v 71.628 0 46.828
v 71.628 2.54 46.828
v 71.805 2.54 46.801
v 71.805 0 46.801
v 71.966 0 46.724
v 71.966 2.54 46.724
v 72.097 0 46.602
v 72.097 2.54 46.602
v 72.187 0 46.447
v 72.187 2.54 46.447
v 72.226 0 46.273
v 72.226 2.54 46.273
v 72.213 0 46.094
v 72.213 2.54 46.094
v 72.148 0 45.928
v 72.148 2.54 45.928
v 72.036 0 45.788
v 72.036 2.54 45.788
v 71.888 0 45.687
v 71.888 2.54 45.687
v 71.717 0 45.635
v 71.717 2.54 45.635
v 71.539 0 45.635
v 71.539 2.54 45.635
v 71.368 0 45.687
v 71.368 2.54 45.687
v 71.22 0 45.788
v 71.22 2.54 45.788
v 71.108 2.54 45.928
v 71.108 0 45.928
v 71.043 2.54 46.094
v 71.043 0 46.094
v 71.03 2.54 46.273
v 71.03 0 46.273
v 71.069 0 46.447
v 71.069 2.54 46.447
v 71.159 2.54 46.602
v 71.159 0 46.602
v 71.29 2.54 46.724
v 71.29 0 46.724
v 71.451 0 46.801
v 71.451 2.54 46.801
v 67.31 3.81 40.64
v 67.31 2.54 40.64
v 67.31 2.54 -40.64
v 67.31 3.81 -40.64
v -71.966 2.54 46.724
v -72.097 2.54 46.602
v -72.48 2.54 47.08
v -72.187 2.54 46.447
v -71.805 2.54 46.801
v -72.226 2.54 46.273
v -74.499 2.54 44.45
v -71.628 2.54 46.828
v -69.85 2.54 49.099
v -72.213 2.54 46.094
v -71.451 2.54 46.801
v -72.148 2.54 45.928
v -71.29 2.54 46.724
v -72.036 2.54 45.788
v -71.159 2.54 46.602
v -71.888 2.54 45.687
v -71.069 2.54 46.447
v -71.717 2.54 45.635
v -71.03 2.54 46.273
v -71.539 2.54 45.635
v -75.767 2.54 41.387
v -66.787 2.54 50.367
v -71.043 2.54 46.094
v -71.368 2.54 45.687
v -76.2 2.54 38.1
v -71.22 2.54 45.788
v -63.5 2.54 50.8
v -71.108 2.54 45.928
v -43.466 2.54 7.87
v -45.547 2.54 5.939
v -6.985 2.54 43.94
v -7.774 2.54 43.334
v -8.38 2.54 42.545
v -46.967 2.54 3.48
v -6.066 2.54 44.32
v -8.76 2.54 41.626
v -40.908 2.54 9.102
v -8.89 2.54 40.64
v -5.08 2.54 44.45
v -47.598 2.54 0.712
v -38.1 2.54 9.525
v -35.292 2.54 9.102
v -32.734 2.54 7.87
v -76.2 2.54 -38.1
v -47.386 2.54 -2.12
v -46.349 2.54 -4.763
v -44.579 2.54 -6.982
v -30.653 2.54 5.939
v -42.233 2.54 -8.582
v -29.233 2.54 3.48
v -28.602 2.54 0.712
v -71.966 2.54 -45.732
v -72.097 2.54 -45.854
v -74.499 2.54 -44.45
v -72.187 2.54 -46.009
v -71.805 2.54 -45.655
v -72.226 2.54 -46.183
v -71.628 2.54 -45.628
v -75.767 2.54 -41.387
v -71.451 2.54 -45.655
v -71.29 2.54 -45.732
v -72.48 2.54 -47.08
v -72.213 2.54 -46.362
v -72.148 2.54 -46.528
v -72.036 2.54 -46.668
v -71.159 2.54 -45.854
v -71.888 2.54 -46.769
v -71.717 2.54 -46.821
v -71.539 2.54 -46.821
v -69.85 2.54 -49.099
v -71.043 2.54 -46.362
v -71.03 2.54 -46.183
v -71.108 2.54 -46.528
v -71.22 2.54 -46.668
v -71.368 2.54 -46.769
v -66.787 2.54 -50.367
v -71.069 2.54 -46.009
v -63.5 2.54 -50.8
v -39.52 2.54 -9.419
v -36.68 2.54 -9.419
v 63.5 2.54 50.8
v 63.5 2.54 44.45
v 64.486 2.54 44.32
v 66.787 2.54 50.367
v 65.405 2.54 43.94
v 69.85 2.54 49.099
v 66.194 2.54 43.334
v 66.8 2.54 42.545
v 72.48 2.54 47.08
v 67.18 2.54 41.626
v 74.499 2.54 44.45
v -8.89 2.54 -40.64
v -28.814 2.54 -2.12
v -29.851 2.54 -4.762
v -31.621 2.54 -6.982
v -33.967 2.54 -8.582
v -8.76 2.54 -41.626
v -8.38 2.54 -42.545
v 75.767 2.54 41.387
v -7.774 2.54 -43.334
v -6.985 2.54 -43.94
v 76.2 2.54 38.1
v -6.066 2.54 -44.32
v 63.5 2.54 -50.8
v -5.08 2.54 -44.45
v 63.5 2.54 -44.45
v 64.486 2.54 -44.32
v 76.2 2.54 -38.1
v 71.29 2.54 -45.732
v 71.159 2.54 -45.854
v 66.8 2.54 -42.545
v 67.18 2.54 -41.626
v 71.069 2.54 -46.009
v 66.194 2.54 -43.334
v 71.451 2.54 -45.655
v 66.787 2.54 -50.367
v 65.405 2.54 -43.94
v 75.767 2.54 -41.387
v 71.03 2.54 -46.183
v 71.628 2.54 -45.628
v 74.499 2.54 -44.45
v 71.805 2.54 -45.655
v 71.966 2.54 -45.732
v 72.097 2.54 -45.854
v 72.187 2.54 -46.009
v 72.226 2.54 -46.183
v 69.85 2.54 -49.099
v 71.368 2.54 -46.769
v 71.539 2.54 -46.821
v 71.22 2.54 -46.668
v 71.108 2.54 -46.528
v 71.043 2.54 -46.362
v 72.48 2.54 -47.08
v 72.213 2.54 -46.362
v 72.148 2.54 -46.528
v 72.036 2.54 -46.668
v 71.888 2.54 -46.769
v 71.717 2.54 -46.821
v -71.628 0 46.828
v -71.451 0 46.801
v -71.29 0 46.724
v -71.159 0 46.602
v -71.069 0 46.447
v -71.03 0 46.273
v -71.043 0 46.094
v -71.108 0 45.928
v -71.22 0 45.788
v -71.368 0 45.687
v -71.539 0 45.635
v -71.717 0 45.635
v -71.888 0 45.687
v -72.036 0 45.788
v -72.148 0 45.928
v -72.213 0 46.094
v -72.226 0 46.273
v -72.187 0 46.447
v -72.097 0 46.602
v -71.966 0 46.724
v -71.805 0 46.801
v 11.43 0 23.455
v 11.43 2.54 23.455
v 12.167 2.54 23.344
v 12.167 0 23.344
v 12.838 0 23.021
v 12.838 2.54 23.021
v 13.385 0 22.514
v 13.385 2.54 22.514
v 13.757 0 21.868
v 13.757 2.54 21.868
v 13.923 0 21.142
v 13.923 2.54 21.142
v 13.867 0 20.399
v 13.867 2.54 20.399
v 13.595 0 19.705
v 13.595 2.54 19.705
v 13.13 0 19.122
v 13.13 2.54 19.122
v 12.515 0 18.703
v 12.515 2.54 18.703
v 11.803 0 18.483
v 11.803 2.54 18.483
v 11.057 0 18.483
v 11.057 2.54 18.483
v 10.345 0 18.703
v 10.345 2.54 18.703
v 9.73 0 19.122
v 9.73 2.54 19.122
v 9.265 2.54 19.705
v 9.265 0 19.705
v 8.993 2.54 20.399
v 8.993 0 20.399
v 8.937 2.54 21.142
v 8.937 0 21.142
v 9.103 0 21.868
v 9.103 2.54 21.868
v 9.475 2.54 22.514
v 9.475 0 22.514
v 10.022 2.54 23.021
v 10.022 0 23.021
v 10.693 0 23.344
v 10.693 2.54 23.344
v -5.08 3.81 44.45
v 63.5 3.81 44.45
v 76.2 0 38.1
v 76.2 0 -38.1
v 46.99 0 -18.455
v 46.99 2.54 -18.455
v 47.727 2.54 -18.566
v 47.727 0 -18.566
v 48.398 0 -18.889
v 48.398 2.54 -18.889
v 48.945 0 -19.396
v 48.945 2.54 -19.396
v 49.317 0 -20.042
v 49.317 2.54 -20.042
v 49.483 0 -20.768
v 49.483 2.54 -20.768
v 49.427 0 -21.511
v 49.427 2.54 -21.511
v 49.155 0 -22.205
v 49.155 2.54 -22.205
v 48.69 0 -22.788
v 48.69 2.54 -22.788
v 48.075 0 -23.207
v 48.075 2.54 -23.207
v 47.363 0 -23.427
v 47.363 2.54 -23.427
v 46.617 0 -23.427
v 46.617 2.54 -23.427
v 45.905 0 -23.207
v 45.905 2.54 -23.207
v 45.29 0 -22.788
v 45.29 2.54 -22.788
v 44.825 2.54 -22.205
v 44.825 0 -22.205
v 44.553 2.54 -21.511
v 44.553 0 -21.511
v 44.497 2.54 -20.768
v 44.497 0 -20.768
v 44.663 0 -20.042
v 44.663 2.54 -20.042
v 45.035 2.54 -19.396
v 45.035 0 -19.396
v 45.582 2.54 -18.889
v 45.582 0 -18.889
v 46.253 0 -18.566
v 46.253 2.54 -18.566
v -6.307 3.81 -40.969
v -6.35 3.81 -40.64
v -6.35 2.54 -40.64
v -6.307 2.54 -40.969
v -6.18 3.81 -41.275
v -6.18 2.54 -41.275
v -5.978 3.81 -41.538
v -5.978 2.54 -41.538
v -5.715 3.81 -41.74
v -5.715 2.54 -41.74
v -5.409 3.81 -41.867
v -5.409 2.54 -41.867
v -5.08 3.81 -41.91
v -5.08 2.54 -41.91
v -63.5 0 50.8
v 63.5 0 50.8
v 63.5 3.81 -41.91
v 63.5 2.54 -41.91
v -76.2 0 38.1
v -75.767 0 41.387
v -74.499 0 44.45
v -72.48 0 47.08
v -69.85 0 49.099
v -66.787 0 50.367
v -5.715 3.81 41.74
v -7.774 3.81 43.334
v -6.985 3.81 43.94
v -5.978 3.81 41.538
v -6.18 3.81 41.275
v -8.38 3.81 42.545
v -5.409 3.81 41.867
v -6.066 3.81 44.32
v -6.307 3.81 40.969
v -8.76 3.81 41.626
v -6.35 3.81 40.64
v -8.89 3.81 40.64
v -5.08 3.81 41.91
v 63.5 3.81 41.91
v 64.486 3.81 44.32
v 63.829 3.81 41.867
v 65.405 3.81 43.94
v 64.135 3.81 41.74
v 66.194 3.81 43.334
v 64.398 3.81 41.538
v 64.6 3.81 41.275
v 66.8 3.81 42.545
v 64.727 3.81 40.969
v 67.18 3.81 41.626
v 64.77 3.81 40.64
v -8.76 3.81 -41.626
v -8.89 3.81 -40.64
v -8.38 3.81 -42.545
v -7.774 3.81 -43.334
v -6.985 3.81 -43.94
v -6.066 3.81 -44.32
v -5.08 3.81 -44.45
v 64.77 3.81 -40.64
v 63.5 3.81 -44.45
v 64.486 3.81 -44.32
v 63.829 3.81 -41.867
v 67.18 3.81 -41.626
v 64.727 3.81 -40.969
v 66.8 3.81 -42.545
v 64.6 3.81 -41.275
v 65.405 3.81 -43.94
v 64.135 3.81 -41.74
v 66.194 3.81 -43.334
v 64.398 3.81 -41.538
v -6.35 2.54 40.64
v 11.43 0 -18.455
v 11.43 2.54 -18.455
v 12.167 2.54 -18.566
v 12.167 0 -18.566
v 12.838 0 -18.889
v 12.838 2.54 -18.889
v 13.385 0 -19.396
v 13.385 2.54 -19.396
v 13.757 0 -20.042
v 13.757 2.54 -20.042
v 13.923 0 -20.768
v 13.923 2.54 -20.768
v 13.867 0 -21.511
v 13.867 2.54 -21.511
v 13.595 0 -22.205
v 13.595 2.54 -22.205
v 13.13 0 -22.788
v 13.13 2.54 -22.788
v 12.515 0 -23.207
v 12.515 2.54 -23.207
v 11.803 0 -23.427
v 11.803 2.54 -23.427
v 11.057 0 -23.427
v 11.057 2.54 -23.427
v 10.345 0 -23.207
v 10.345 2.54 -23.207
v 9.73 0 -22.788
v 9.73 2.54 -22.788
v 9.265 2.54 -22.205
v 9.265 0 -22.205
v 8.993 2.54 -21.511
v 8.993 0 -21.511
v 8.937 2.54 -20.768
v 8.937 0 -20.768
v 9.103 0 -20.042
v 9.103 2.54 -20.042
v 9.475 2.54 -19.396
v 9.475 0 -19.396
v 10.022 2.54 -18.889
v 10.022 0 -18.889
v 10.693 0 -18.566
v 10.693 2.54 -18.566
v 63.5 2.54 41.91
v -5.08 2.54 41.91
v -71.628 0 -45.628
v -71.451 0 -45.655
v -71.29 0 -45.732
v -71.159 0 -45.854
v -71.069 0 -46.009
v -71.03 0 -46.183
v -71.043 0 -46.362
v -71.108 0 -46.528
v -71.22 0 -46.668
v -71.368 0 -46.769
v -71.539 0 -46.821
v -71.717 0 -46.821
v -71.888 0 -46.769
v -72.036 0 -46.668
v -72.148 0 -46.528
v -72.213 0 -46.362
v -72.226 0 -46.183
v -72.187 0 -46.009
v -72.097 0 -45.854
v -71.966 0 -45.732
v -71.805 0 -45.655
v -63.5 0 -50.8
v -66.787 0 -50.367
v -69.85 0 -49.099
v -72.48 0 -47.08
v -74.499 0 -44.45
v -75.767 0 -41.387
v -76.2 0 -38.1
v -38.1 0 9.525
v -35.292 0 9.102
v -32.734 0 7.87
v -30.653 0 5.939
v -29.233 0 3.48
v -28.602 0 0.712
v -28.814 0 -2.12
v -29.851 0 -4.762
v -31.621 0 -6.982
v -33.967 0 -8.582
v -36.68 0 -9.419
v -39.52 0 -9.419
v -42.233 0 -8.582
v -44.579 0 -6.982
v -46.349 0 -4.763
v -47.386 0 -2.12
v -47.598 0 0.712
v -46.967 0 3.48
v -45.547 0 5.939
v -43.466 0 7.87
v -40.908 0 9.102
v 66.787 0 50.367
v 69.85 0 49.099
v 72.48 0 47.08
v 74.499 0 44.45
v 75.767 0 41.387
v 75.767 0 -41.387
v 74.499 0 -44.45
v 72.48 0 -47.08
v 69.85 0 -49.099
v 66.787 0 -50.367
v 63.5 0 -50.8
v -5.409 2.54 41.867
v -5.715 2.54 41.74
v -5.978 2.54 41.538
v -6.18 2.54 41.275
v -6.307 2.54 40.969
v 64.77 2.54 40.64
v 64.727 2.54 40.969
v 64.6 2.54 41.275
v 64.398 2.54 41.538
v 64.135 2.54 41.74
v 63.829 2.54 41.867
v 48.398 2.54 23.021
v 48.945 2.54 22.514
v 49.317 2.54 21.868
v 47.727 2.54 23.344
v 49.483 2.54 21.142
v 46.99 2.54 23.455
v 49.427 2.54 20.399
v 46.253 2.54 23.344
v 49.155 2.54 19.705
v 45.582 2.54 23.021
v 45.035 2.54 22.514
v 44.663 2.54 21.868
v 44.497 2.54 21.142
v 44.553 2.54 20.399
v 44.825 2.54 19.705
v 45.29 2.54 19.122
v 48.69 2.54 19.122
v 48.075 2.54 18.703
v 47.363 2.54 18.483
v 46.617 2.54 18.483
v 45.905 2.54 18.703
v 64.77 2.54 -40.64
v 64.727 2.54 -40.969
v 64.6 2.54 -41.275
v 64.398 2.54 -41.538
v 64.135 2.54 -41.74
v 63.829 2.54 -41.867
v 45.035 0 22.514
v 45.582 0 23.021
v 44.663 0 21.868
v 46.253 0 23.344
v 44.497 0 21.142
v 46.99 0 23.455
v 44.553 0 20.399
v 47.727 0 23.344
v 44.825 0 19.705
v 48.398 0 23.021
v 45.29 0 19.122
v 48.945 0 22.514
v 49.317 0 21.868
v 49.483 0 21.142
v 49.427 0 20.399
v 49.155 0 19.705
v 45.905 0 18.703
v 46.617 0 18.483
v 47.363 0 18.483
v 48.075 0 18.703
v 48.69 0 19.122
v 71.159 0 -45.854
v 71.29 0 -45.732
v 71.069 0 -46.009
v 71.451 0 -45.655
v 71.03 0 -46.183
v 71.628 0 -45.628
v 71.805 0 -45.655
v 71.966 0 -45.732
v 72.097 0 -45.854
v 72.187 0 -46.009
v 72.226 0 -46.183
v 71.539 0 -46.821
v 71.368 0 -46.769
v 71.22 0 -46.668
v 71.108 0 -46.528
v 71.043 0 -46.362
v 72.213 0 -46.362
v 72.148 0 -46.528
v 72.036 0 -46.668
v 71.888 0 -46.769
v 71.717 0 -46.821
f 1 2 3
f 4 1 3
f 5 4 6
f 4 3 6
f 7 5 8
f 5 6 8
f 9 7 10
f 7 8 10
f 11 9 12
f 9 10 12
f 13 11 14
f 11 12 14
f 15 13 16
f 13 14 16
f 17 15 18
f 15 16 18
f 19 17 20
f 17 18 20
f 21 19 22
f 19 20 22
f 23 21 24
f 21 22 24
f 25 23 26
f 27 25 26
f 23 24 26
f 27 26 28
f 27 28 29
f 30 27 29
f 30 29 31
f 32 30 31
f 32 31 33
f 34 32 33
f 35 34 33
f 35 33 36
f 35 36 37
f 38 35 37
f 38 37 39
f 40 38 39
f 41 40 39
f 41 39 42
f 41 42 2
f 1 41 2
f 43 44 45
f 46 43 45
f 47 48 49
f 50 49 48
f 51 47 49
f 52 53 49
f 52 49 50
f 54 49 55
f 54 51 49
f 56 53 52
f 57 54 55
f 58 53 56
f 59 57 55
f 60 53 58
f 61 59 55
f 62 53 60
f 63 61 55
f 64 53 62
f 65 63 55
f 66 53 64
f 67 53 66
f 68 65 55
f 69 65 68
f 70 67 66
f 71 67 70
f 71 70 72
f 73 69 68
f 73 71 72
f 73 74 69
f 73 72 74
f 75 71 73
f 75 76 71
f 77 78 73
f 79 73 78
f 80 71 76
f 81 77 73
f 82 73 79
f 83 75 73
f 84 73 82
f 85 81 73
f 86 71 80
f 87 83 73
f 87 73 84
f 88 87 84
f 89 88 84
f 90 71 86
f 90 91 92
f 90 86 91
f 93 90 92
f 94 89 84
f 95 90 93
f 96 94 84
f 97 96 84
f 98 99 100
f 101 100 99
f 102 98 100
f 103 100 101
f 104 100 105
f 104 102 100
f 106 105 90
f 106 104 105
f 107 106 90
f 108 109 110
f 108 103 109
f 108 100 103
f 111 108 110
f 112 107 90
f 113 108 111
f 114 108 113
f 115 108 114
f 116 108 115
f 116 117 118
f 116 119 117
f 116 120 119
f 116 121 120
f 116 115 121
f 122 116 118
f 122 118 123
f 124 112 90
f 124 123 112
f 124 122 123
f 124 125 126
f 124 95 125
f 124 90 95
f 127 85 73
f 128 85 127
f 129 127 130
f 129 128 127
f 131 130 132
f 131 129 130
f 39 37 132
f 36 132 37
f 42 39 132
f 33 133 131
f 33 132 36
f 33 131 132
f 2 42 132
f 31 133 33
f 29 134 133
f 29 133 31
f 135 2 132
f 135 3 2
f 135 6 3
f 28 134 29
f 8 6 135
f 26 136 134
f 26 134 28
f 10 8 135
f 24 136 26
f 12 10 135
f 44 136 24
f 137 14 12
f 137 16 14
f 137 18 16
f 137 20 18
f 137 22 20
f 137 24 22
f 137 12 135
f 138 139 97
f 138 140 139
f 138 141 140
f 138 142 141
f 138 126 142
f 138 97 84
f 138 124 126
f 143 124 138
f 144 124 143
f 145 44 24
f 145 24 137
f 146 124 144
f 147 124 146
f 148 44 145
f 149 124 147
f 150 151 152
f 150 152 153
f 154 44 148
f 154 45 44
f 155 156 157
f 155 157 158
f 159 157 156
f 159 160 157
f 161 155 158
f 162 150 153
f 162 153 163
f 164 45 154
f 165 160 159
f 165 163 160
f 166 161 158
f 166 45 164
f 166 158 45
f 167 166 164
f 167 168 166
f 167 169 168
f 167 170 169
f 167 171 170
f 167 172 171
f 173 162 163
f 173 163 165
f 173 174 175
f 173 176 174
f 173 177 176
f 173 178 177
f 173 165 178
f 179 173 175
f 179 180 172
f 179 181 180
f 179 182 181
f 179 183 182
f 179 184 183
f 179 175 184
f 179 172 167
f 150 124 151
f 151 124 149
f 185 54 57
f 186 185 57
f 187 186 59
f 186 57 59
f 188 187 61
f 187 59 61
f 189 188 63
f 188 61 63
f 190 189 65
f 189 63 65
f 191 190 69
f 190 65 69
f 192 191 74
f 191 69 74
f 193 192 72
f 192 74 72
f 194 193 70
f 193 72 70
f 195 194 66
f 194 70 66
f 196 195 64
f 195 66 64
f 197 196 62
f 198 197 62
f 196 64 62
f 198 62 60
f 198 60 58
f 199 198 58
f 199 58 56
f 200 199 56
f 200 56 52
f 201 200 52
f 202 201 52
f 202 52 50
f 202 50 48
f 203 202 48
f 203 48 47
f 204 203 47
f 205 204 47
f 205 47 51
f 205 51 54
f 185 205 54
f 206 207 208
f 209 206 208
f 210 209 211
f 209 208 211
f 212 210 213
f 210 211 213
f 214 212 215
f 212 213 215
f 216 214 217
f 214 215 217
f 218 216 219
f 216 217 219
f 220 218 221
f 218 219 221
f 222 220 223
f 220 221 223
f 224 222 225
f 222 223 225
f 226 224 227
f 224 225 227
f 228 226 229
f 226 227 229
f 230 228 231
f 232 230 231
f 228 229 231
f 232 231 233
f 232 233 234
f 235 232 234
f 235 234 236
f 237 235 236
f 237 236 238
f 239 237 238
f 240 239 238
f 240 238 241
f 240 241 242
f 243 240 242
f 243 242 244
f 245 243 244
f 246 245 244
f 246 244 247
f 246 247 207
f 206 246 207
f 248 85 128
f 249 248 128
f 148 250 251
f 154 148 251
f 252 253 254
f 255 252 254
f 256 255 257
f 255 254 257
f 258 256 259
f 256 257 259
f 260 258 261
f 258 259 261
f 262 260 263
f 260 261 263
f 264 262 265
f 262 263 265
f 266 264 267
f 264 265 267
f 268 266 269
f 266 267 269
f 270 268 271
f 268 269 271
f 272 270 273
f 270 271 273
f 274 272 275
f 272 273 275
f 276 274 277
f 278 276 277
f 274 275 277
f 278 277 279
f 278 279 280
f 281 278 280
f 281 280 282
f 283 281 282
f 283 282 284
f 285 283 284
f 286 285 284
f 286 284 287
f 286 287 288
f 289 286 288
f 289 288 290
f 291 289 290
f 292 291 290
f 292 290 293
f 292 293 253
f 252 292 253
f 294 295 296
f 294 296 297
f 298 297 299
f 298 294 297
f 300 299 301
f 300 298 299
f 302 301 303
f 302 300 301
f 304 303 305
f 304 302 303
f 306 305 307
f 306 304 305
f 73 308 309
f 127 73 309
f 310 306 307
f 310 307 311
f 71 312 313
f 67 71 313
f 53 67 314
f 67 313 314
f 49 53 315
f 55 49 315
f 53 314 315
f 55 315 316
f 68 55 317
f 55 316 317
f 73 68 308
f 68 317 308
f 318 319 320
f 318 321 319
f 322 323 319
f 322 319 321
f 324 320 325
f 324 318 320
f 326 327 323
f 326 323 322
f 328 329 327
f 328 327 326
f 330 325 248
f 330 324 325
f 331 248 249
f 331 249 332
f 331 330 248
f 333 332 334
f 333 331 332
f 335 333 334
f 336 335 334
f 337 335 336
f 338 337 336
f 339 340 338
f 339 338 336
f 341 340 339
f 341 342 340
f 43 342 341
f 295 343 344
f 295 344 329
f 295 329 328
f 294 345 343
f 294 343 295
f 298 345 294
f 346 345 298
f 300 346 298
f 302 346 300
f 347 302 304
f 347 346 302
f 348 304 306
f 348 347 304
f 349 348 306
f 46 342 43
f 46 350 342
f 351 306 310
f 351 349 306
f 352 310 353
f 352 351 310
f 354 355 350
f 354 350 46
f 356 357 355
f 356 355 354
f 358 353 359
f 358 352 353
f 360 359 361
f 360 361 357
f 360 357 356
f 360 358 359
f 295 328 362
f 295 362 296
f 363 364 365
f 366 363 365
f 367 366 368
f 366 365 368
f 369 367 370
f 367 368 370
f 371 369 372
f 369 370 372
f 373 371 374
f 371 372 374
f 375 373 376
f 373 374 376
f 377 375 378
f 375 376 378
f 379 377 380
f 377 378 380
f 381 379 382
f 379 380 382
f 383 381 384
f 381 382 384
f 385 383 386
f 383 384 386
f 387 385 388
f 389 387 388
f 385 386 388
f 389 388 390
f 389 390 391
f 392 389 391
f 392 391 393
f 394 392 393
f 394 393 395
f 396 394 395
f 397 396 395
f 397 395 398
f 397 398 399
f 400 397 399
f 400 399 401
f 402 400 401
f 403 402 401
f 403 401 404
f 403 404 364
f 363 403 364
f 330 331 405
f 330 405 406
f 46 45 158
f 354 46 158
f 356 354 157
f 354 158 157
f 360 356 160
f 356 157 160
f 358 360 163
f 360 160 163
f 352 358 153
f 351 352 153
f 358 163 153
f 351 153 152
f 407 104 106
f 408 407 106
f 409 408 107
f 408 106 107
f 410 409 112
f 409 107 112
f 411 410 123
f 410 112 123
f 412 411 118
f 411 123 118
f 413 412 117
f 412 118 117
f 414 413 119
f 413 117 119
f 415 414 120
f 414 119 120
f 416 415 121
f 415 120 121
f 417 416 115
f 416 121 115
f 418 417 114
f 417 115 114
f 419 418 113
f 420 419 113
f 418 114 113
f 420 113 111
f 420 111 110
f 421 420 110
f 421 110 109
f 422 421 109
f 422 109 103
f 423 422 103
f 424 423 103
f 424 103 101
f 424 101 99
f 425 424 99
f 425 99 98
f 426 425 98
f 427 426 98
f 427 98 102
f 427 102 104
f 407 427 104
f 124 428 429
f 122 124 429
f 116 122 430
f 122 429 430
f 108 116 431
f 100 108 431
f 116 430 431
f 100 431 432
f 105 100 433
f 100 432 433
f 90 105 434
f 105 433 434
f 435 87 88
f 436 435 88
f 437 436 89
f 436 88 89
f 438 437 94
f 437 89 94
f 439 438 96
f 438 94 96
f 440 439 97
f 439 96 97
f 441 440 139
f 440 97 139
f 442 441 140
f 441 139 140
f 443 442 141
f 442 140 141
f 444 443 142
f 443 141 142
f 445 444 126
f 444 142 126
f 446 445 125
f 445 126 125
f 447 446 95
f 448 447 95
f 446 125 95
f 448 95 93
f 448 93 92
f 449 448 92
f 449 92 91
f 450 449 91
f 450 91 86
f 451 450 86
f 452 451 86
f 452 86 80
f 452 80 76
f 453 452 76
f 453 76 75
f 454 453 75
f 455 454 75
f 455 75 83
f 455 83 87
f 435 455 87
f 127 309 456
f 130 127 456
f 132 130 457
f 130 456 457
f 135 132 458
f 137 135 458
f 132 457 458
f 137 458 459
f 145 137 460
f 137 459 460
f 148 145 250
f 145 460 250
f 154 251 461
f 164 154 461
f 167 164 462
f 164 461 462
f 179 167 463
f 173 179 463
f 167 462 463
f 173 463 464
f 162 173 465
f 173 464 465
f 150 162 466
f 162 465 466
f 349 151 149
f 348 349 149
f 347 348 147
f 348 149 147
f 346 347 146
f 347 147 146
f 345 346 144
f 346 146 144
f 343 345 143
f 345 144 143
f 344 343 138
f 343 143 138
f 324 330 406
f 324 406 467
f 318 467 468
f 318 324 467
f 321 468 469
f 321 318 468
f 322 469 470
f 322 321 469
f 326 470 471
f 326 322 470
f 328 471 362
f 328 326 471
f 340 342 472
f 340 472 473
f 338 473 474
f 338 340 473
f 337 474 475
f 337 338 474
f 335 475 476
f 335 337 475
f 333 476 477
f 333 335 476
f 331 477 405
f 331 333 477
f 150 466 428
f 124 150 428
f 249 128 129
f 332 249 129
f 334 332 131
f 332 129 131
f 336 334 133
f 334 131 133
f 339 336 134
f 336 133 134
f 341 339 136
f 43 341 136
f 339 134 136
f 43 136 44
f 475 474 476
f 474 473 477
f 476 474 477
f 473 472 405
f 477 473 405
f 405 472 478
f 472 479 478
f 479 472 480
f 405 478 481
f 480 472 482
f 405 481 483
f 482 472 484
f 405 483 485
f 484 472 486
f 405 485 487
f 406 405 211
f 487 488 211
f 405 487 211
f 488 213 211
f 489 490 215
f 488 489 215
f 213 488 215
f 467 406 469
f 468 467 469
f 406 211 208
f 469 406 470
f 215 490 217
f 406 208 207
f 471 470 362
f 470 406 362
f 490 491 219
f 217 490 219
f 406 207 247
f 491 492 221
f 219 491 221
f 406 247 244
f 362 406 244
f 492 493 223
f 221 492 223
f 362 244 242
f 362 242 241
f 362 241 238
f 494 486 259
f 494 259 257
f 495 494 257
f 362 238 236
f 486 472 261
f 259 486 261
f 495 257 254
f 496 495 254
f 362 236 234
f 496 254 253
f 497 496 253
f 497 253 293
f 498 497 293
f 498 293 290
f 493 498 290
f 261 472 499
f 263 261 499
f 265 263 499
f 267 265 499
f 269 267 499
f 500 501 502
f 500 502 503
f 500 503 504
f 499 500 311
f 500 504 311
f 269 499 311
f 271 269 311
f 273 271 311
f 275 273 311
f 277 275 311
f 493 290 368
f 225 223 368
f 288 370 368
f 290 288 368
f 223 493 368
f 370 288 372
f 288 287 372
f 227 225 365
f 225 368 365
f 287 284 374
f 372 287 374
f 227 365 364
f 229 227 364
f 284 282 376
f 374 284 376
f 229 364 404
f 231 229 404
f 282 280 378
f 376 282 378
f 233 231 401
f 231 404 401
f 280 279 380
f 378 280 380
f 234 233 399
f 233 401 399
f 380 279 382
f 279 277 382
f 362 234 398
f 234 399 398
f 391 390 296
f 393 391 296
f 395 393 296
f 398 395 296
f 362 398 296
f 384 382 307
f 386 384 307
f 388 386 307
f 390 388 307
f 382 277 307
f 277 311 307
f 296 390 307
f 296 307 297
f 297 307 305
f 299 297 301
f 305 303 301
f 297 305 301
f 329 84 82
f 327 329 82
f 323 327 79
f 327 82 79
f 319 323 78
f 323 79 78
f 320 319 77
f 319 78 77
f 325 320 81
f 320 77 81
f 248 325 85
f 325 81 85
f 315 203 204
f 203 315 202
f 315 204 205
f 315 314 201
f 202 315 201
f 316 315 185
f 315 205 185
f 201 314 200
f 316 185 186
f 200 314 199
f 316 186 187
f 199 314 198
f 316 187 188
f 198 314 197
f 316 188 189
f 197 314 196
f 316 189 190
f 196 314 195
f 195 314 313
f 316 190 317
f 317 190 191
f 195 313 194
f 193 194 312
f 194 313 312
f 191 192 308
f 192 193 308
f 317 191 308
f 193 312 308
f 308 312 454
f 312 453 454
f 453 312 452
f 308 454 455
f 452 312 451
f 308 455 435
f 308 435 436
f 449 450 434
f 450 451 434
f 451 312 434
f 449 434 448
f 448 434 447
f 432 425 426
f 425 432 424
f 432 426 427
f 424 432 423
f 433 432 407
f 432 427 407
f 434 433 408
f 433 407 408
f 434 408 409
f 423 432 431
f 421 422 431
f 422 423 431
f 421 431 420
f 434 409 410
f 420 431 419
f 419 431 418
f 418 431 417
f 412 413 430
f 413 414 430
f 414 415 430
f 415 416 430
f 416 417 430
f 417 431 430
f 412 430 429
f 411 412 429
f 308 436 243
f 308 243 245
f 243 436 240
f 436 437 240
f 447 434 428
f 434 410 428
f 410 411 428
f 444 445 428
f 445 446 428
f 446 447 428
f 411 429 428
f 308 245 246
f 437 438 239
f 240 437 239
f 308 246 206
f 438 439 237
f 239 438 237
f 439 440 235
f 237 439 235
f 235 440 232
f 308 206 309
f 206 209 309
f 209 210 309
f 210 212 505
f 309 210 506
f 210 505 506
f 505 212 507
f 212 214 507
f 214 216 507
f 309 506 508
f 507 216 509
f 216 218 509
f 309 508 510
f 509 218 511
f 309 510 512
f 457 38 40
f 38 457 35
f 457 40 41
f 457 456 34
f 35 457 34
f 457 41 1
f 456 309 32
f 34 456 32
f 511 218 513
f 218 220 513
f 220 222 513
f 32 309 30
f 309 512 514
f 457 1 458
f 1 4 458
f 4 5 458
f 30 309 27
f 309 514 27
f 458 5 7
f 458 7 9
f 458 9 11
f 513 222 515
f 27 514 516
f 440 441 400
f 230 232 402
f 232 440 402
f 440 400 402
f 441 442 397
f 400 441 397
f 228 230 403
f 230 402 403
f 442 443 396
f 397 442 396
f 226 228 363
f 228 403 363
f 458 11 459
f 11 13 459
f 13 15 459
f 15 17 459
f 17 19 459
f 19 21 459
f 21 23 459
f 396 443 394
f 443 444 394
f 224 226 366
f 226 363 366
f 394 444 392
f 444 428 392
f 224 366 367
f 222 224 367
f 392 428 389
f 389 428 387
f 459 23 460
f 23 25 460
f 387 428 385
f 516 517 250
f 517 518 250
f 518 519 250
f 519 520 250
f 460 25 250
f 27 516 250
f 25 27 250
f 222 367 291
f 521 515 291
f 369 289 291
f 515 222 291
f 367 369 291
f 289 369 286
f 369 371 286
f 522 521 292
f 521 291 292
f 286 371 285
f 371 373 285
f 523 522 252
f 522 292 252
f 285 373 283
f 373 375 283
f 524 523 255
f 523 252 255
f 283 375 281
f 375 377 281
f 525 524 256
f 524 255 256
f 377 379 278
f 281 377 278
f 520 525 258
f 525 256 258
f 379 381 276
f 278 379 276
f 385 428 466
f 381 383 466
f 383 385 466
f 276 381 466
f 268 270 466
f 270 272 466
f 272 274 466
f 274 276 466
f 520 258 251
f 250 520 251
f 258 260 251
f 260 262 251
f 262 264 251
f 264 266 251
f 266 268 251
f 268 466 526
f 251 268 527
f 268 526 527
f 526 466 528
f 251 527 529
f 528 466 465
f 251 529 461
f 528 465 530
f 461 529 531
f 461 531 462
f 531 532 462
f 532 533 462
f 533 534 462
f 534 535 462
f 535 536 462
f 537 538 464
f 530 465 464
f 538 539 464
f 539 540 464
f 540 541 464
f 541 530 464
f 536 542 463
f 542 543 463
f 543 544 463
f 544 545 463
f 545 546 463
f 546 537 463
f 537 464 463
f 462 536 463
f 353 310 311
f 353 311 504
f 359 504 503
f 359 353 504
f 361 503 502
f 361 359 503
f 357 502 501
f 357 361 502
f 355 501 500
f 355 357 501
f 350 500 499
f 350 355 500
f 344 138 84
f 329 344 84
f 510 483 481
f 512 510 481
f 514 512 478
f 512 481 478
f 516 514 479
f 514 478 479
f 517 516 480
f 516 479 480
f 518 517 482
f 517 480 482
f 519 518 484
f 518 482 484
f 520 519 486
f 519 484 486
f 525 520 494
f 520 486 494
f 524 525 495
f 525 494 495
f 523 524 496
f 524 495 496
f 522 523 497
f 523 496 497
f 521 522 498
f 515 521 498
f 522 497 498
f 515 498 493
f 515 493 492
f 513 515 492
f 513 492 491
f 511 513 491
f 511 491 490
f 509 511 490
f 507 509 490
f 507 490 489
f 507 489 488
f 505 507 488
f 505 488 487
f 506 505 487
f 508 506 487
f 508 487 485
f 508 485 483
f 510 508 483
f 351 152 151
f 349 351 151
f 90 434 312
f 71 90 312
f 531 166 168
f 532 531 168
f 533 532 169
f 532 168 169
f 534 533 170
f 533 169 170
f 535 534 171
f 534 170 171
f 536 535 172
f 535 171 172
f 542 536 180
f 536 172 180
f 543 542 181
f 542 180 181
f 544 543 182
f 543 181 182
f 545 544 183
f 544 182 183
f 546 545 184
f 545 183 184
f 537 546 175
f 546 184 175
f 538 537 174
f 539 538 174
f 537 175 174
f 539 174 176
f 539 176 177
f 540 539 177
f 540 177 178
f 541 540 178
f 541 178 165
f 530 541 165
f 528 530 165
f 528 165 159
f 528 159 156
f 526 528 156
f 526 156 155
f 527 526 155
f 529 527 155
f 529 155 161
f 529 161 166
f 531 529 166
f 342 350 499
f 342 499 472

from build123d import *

# Parameters (mm, degrees)
BOSS_EXTRUDE1_DEPTH = 2.54
SKETCH2_R           = 0.6
CUT_EXTRUDE1_DEPTH  = 92.616219088
BOSS_EXTRUDE2_DEPTH = 1.27
CUT_EXTRUDE2_DEPTH  = 1.27
SKETCH5_R           = 2.499995
CUT_EXTRUDE3_DEPTH  = 92.616219088
SKETCH6_R           = 9.525
CUT_EXTRUDE4_DEPTH  = 10.16


with BuildPart() as part:
    # Sketch1 → Boss-Extrude1 (new body)
    with BuildSketch(Plane(origin=(0, 0, 0), x_dir=(1, 0, 0), z_dir=(0, 1, 0))):
        with BuildLine():
            Line((63.5, 50.8), (-63.5, 50.8))
            ThreePointArc((-63.5, 50.8), (-72.480256121, 47.080256121), (-76.2, 38.1))
            Line((-76.2, 38.1), (-76.2, -38.1))
            ThreePointArc((-76.2, -38.1), (-72.480256121, -47.080256121), (-63.5, -50.8))
            Line((-63.5, -50.8), (63.5, -50.8))
            ThreePointArc((63.5, -50.8), (72.480256121, -47.080256121), (76.2, -38.1))
            Line((76.2, -38.1), (76.2, 38.1))
            ThreePointArc((76.2, 38.1), (72.480256121, 47.080256121), (63.5, 50.8))
        make_face()
    extrude(amount=BOSS_EXTRUDE1_DEPTH)

    # Sketch2 → Cut-Extrude1 (cut, through all)
    with BuildSketch(Plane(origin=(0, 2.54, 0), x_dir=(1, 0, 0), z_dir=(0, 1, 0))):
        with Locations(Location((-71.628, 46.228, 0), (0, 0, 270))):
            Circle(SKETCH2_R)
        with Locations(Location((-71.628, -46.228, 0), (0, 0, 270))):
            Circle(SKETCH2_R)
        with Locations(Location((71.628, -46.228, 0), (0, 0, 270))):
            Circle(SKETCH2_R)
        with Locations(Location((71.628, 46.228, 0), (0, 0, 270))):
            Circle(SKETCH2_R)
    extrude(amount=-CUT_EXTRUDE1_DEPTH, mode=Mode.SUBTRACT)

    # Sketch3 → Boss-Extrude2 (add)
    with BuildSketch(Plane(origin=(0, 2.54, 0), x_dir=(1, 0, 0), z_dir=(0, 1, 0))):
        with BuildLine():
            Line((63.5, 44.45), (-5.08, 44.45))
            ThreePointArc((-5.08, 44.45), (-7.774076836, 43.334076836), (-8.89, 40.64))
            Line((-8.89, 40.64), (-8.89, -40.64))
            ThreePointArc((-8.89, -40.64), (-7.774076836, -43.334076836), (-5.08, -44.45))
            Line((-5.08, -44.45), (63.5, -44.45))
            ThreePointArc((63.5, -44.45), (66.194076836, -43.334076836), (67.31, -40.64))
            Line((67.31, -40.64), (67.31, 40.64))
            ThreePointArc((67.31, 40.64), (66.194076836, 43.334076836), (63.5, 44.45))
        make_face()
    extrude(amount=BOSS_EXTRUDE2_DEPTH)

    # Sketch4 → Cut-Extrude2 (cut)
    with BuildSketch(Plane(origin=(0, 3.81, 0), x_dir=(1, 0, 0), z_dir=(0, 1, 0))):
        with BuildLine():
            Line((-5.08, 41.91), (63.5, 41.91))
            ThreePointArc((63.5, 41.91), (64.398025612, 41.538025612), (64.77, 40.64))
            Line((64.77, 40.64), (64.77, -40.64))
            ThreePointArc((64.77, -40.64), (64.398025612, -41.538025612), (63.5, -41.91))
            Line((63.5, -41.91), (-5.08, -41.91))
            ThreePointArc((-5.08, -41.91), (-5.978025612, -41.538025612), (-6.35, -40.64))
            Line((-6.35, -40.64), (-6.35, 40.64))
            ThreePointArc((-6.35, 40.64), (-5.978025612, 41.538025612), (-5.08, 41.91))
        make_face()
    extrude(amount=-CUT_EXTRUDE2_DEPTH, mode=Mode.SUBTRACT)

    # Sketch5 → Cut-Extrude3 (cut, through all)
    with BuildSketch(Plane(origin=(0, 2.54, 0), x_dir=(1, 0, 0), z_dir=(0, 1, 0))):
        with Locations(Location((11.43, 20.955, 0), (0, 0, 270))):
            Circle(SKETCH5_R)
        with Locations(Location((46.99, 20.955, 0), (0, 0, 270))):
            Circle(SKETCH5_R)
        with Locations(Location((11.43, -20.955, 0), (0, 0, 270))):
            Circle(SKETCH5_R)
        with Locations(Location((46.99, -20.955, 0), (0, 0, 270))):
            Circle(SKETCH5_R)
    extrude(amount=-CUT_EXTRUDE3_DEPTH, mode=Mode.SUBTRACT)

    # Sketch6 → Cut-Extrude4 (cut)
    with BuildSketch(Plane(origin=(0, 2.54, 0), x_dir=(1, 0, 0), z_dir=(0, 1, 0))):
        with Locations(Location((-38.1, 0, 0), (0, 0, 270))):
            Circle(SKETCH6_R)
    extrude(amount=-CUT_EXTRUDE4_DEPTH, mode=Mode.SUBTRACT)


solid = part.part
